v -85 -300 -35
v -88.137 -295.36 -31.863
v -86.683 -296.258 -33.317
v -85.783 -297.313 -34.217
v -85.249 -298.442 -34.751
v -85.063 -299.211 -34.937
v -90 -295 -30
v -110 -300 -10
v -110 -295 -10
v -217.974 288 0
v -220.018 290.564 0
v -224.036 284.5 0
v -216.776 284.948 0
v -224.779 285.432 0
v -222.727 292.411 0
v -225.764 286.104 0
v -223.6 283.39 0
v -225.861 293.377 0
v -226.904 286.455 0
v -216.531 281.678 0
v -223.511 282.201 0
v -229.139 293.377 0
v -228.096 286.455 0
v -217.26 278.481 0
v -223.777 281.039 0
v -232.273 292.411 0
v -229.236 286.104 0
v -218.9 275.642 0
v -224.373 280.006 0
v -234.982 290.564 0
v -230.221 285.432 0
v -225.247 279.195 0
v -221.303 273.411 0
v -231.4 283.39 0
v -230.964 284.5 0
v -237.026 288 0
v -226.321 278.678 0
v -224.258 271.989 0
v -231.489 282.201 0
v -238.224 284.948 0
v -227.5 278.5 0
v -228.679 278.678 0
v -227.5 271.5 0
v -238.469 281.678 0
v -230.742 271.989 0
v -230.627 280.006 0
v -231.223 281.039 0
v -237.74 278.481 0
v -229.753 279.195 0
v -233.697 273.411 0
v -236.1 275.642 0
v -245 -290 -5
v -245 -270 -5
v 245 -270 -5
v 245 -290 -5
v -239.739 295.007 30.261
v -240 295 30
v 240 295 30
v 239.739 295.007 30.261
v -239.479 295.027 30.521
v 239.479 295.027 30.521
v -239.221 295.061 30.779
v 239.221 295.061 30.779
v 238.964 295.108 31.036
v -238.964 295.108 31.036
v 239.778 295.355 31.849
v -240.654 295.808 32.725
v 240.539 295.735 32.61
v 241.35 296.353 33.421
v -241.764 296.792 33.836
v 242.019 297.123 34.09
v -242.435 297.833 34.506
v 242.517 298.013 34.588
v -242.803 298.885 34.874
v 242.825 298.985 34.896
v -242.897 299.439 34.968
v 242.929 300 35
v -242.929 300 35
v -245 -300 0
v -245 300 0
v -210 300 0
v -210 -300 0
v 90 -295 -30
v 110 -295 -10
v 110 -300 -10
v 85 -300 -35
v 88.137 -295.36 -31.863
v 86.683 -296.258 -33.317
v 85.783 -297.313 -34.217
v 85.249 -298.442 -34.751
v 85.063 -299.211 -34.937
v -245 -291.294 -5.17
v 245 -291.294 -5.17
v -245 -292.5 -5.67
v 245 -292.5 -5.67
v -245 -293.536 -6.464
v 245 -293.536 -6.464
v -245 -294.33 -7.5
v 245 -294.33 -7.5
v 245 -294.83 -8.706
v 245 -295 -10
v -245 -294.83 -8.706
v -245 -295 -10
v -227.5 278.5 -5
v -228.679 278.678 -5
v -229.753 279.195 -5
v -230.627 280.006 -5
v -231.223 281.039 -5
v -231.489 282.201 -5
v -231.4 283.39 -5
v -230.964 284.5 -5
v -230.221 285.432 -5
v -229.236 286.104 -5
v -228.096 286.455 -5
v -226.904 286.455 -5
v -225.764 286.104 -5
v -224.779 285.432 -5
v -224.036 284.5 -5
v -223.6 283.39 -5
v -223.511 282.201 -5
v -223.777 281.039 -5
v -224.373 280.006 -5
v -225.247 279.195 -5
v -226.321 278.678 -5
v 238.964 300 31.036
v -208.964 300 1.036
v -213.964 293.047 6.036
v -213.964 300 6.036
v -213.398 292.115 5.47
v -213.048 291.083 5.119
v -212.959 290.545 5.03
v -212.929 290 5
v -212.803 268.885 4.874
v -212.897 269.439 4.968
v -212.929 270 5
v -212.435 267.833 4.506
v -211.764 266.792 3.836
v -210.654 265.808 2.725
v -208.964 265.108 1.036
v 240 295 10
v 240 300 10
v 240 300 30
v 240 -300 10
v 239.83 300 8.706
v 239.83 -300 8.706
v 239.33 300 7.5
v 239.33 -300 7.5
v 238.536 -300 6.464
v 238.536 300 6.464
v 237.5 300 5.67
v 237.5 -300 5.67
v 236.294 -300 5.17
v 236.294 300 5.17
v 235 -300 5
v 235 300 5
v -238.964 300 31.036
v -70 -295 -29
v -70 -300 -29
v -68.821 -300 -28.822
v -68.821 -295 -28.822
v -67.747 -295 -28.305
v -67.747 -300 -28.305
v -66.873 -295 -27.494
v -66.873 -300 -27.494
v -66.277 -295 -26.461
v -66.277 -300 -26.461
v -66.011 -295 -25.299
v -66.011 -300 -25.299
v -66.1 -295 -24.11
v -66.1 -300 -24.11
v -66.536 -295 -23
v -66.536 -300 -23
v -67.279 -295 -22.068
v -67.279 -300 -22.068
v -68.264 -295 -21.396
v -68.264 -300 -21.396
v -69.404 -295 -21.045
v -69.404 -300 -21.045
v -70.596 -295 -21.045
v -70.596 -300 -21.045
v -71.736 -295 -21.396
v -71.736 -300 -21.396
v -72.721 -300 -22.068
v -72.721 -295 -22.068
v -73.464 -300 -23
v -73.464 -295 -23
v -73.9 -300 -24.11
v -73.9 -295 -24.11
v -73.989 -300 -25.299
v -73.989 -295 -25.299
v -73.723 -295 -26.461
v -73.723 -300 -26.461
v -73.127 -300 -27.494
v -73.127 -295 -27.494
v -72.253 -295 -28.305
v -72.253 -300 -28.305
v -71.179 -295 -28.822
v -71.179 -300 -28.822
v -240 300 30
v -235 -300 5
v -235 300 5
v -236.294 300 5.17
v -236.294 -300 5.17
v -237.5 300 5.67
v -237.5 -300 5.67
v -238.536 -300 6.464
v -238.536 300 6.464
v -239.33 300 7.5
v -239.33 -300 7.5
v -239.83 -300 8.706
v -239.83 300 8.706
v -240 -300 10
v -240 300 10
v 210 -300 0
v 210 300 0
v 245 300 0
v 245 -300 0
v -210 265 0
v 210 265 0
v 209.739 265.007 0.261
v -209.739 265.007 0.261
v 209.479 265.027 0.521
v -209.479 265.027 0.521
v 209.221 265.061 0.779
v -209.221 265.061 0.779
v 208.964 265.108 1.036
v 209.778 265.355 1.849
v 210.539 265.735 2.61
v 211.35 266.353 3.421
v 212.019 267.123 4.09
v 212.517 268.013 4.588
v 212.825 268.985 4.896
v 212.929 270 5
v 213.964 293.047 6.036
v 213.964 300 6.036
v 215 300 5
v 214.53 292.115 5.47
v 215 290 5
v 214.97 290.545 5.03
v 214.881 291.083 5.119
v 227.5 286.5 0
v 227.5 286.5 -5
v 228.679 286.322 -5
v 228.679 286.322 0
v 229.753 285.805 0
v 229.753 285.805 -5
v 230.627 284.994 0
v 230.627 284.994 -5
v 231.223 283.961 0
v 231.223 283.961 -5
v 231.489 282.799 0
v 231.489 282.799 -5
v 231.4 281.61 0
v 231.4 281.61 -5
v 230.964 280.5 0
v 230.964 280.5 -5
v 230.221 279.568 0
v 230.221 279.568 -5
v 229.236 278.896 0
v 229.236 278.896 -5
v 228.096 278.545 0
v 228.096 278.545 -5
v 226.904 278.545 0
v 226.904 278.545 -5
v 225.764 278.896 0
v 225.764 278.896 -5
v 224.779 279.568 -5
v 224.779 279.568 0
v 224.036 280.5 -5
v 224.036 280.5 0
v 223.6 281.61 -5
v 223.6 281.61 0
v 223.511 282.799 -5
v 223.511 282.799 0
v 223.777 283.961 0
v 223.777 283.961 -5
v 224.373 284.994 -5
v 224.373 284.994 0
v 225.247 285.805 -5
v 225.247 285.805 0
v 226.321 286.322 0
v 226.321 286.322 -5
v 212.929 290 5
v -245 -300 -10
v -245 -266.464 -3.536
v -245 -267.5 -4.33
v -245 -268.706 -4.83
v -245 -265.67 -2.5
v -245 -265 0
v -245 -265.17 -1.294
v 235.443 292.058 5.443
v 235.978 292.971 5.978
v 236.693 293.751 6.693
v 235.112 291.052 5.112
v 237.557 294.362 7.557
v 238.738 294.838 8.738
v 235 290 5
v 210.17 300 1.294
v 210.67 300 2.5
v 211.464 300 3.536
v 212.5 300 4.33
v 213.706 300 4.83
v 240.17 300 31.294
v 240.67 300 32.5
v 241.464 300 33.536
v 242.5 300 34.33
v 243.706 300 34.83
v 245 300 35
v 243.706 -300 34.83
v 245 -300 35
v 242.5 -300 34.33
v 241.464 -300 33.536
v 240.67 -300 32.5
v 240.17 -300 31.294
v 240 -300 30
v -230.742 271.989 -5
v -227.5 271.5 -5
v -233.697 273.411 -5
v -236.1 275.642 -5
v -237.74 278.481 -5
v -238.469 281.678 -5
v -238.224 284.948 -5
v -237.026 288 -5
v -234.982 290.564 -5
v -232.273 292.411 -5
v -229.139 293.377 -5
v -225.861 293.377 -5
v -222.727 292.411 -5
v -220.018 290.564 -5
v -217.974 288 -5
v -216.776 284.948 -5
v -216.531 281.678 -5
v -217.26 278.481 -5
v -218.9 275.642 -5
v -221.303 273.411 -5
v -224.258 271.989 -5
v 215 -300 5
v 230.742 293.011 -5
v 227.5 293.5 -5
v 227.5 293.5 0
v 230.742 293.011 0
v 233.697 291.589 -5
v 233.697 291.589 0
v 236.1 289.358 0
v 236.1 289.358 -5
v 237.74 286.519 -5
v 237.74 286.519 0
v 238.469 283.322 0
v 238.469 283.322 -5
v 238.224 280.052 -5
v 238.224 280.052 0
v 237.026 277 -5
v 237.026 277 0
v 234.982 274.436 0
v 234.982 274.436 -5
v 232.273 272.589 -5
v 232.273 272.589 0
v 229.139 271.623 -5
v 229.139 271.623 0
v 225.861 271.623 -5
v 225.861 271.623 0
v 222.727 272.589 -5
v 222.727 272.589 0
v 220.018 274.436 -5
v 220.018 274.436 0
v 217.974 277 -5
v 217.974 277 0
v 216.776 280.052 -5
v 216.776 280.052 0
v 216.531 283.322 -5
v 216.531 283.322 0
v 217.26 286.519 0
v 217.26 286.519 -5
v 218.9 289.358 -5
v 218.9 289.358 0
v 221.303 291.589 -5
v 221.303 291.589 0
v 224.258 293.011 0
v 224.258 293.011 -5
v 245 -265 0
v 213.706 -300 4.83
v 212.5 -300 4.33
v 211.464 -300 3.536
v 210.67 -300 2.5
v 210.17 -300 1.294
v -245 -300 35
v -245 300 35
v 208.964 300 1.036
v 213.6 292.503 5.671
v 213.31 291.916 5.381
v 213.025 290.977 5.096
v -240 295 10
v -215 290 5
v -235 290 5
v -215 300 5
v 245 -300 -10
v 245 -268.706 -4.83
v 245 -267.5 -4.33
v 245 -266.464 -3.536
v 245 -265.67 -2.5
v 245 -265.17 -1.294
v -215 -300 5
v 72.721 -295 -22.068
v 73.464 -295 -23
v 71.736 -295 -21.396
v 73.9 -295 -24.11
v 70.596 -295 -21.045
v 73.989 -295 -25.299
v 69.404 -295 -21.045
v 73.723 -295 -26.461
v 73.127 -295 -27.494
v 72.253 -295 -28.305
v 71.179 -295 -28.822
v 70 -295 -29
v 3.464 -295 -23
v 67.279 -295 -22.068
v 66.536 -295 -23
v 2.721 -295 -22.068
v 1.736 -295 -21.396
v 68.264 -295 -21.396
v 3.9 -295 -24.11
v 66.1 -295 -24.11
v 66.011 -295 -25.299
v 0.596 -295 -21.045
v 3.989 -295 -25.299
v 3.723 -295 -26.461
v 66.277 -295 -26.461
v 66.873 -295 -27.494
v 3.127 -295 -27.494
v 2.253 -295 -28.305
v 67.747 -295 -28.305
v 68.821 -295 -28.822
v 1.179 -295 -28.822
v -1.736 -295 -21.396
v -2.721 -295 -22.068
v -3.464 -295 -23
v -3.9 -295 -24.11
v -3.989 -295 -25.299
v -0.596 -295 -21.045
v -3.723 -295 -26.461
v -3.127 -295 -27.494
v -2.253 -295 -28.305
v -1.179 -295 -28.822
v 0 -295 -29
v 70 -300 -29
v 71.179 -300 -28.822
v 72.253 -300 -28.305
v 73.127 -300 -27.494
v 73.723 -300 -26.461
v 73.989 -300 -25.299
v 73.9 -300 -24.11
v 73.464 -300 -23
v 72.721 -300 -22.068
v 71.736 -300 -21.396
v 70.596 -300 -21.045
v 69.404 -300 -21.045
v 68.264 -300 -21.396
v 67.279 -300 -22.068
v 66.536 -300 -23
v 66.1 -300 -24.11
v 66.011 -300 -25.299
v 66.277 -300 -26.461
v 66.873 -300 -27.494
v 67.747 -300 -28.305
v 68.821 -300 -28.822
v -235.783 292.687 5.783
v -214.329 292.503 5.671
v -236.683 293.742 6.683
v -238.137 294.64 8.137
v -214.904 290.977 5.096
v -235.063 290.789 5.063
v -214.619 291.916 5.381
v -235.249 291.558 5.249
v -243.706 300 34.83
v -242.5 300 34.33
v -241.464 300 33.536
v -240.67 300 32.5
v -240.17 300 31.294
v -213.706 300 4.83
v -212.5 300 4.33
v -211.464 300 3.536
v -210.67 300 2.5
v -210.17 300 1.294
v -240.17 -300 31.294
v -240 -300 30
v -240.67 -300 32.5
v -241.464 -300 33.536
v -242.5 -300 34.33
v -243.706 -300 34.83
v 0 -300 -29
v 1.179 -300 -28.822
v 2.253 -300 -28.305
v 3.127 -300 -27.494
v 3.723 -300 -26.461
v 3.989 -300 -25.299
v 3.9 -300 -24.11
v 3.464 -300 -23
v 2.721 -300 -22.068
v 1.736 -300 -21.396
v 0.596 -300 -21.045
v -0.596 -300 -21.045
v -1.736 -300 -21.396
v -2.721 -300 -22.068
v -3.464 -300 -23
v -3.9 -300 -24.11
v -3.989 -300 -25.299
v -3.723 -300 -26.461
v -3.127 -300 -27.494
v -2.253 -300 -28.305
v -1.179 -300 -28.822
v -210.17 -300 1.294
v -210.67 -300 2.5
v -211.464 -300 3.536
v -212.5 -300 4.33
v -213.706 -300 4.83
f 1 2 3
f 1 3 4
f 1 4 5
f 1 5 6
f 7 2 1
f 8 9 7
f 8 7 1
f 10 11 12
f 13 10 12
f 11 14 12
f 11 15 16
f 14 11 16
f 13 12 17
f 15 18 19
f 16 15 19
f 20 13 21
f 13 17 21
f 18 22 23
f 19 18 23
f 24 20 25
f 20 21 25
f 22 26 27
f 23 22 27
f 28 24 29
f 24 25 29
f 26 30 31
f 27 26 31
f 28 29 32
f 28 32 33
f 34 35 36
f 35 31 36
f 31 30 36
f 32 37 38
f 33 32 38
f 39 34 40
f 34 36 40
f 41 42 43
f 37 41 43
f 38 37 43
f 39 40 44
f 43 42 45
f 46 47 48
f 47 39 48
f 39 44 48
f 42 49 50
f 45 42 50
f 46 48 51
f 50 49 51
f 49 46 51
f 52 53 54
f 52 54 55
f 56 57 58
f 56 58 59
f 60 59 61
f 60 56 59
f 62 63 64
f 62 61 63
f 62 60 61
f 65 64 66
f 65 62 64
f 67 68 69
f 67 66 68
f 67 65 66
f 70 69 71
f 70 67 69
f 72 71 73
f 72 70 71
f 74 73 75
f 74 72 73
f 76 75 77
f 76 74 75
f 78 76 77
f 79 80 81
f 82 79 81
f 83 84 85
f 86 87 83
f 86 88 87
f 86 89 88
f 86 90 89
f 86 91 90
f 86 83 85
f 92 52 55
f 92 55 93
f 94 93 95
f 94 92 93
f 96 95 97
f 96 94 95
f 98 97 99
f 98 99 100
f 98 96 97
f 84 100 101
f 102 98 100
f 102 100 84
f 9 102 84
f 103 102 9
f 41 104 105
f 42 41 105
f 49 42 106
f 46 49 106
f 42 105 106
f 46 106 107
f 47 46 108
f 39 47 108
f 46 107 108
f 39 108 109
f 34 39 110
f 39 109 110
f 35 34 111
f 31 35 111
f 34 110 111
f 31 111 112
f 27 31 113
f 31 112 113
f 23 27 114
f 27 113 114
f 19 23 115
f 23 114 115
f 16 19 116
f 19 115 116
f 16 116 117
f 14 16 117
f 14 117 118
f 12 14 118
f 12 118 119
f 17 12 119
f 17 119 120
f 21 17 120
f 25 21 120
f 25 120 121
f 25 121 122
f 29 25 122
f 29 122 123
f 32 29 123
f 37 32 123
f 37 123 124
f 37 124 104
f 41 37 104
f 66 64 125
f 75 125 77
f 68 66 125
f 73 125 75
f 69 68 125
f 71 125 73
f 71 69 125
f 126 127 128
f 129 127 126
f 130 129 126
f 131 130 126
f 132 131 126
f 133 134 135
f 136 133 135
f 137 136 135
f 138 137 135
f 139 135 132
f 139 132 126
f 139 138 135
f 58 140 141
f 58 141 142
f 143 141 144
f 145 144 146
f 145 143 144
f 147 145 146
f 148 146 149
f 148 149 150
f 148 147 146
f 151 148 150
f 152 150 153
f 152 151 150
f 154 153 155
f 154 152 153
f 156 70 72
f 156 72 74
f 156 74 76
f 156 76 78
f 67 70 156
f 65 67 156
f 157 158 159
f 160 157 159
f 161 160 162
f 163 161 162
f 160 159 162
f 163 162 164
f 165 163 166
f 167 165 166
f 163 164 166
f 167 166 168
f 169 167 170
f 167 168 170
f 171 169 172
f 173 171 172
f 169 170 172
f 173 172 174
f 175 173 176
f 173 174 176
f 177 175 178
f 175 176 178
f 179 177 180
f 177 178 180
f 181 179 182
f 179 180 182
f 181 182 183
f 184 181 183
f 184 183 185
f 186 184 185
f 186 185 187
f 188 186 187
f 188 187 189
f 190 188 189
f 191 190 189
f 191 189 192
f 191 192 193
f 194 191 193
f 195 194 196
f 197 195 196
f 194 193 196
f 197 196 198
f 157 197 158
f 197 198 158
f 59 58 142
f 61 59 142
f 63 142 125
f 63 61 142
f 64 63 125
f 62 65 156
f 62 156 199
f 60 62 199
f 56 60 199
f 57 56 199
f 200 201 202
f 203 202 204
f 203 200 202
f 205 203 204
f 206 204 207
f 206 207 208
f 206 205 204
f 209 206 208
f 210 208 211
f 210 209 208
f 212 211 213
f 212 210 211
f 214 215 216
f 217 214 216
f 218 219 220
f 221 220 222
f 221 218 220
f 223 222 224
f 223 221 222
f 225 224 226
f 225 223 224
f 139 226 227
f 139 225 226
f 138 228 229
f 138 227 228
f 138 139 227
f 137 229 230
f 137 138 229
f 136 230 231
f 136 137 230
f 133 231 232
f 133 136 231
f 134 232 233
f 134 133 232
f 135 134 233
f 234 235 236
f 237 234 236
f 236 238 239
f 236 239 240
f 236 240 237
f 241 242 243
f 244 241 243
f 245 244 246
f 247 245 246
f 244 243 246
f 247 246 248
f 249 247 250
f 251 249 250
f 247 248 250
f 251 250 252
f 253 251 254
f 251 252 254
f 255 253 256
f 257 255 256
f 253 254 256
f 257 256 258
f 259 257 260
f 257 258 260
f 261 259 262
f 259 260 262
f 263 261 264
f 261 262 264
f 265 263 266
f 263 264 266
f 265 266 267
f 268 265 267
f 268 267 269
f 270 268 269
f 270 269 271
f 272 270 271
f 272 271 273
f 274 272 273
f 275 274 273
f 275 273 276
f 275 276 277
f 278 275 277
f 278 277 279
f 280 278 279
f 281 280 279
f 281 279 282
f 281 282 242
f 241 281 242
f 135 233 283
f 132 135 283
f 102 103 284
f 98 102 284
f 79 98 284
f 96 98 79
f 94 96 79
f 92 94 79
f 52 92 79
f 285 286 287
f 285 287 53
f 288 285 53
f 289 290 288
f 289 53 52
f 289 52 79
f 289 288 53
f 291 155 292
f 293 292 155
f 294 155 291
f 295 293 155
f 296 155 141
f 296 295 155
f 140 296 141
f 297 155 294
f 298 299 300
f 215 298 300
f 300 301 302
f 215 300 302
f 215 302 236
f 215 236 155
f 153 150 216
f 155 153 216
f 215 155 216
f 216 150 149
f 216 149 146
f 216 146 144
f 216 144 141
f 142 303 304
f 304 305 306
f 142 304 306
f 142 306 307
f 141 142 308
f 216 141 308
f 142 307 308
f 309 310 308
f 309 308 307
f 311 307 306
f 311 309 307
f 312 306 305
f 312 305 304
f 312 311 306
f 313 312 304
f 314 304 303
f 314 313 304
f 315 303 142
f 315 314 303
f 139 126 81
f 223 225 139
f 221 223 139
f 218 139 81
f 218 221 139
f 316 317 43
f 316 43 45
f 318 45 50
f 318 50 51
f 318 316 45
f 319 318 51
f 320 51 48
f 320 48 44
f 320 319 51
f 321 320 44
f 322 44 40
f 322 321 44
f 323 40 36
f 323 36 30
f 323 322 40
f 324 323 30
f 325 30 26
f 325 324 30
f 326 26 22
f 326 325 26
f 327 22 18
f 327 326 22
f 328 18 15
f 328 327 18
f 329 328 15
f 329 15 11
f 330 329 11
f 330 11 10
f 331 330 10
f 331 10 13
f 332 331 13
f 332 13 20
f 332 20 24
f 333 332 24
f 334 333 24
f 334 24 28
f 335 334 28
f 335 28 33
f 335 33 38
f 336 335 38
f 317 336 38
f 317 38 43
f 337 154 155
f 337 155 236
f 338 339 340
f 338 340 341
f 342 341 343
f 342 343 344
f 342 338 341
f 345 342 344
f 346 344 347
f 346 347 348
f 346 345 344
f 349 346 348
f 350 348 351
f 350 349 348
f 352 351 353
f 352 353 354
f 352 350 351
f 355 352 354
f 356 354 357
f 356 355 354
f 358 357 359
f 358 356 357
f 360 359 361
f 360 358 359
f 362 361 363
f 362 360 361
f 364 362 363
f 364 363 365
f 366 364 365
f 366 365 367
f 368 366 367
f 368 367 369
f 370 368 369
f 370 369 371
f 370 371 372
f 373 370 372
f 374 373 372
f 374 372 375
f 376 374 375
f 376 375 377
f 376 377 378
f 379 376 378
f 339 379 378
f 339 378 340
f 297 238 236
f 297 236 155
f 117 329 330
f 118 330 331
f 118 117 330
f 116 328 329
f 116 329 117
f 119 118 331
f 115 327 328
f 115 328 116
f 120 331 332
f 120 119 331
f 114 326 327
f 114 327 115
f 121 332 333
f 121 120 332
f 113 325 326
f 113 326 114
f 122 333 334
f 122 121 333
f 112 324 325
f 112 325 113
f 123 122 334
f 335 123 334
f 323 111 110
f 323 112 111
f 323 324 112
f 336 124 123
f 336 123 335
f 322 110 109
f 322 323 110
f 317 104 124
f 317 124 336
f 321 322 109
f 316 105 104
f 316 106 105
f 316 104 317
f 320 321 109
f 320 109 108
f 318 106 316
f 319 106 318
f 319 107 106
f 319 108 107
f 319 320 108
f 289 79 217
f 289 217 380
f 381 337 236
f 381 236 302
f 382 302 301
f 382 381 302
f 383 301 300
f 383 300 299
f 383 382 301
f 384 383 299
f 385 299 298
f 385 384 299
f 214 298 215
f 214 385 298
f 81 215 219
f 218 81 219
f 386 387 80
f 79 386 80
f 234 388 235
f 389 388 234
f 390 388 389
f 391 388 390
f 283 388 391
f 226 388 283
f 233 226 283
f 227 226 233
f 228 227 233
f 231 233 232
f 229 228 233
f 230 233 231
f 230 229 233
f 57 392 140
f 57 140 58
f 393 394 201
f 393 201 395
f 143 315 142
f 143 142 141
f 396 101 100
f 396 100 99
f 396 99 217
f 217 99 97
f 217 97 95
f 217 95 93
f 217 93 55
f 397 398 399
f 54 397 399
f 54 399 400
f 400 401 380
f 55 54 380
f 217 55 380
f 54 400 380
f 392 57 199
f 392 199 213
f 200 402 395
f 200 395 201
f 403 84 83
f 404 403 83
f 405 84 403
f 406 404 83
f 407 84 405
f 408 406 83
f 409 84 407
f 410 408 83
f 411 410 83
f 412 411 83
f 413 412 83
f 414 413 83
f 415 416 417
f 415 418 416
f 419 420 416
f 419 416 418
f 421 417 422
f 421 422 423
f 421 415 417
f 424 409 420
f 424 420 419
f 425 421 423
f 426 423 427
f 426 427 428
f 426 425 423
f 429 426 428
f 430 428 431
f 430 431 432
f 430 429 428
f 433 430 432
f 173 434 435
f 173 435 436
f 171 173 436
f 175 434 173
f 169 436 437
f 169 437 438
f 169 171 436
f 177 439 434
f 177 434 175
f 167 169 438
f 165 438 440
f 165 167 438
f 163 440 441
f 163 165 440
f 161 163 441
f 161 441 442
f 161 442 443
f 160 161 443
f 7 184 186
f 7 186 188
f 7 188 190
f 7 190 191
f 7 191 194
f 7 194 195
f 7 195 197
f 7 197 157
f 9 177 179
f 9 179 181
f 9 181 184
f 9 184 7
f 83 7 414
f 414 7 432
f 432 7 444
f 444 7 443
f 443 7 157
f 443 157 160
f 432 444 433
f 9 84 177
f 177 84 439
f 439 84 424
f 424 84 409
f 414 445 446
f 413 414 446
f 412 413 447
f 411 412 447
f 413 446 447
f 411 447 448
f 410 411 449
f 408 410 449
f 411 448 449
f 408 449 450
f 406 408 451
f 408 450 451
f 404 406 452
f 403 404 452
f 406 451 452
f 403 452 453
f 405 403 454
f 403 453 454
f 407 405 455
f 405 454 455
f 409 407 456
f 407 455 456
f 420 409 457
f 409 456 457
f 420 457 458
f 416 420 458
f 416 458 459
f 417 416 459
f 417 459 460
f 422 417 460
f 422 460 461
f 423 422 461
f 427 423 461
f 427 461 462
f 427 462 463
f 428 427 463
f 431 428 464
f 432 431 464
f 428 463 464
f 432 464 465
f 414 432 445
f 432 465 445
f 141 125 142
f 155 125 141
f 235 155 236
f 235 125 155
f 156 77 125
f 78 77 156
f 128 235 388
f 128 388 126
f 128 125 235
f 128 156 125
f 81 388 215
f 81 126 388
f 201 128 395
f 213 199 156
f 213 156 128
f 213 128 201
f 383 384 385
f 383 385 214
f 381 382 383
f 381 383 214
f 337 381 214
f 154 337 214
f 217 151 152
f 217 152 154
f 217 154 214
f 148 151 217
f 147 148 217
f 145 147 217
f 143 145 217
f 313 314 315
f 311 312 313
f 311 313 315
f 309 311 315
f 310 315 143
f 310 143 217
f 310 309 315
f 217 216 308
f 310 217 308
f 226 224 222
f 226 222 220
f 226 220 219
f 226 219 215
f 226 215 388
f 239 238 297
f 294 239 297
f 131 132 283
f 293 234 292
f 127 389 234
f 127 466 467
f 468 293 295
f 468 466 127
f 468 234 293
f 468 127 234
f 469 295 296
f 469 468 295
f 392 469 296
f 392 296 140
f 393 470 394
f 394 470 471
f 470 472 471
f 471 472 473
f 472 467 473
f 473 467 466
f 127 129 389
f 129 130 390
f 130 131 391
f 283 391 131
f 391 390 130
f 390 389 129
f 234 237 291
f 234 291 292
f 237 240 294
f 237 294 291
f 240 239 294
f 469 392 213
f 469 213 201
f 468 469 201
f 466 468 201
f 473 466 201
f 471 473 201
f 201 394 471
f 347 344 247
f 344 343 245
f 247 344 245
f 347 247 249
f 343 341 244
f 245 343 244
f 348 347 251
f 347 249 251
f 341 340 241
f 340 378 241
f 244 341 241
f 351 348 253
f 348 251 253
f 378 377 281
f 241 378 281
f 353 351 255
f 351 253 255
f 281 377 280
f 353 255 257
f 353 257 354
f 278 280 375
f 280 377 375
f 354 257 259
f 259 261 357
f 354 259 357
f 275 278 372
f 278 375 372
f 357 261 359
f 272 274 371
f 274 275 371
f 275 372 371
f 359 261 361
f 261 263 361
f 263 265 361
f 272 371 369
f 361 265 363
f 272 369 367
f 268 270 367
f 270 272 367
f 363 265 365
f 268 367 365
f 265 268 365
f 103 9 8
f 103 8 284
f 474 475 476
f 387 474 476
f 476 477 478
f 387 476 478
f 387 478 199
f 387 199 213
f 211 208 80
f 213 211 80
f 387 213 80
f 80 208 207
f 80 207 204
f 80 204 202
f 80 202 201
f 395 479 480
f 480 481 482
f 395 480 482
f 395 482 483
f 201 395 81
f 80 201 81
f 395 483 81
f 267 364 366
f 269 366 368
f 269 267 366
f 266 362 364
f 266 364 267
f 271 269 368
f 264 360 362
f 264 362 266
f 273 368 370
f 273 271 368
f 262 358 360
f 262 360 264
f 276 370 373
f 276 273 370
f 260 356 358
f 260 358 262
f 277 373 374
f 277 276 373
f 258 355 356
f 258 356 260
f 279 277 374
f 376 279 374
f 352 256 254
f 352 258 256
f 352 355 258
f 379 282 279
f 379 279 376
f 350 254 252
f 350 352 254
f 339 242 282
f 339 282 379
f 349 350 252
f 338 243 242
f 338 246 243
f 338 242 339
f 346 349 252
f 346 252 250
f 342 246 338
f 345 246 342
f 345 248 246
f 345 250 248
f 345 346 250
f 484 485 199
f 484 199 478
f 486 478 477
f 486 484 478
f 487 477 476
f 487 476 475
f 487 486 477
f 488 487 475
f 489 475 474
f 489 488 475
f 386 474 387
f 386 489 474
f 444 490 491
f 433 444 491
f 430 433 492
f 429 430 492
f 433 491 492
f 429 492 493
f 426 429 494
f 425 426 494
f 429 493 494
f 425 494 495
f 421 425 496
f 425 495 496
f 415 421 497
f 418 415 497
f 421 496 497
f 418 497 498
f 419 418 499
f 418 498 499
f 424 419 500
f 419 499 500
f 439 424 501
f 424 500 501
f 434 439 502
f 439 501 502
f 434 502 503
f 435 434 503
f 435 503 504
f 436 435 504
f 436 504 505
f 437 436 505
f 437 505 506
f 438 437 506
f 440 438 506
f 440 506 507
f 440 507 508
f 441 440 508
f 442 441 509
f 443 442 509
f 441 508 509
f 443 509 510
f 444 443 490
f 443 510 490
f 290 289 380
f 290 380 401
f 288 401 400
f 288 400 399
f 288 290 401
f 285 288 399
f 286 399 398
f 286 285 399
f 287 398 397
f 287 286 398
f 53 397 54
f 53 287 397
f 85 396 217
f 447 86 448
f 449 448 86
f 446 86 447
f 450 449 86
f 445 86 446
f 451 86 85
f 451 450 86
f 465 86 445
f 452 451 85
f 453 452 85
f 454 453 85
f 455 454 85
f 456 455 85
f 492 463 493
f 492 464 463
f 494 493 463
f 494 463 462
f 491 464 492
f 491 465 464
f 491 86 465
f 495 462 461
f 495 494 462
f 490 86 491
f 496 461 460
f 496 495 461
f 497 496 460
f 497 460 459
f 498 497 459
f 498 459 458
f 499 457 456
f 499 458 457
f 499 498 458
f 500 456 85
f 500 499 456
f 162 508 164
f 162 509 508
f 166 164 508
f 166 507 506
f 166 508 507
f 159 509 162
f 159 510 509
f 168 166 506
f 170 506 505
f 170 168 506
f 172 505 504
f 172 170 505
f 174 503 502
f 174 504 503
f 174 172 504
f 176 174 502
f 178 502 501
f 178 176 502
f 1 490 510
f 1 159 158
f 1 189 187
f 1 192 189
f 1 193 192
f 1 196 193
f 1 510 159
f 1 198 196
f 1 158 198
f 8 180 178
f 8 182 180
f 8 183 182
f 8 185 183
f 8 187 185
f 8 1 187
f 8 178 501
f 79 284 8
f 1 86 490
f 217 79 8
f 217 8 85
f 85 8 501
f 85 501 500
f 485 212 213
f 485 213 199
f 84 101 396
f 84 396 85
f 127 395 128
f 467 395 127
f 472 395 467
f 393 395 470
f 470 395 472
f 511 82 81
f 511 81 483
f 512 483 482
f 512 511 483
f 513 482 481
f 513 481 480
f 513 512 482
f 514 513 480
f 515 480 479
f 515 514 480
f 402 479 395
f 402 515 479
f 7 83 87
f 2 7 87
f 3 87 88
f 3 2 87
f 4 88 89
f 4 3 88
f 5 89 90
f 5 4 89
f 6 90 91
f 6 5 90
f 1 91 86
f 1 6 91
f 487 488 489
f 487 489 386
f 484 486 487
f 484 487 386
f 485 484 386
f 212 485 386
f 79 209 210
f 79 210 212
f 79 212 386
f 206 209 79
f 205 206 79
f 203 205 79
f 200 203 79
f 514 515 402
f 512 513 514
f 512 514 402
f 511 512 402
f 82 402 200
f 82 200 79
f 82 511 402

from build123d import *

# Parameters (mm, degrees)
HIERRO_ANGULAR_35_X_35_X_5_1_DEPTH = 600
HIERRO_ANGULAR_35_X_35_X_5_2_DEPTH = 600
HIERRO_ANGULAR_35_X_35_X_5_3_DEPTH = 490
HIERRO_ANGULAR_35_X_35_X_5_5_DEPTH = 490
SALIENTE_EXTRUIR1_REACH            = 391.391
CROQUIS8_R                         = 11
CROQUIS8_R_2                       = 4
RECORTAR_EXTENDER1_START           = 265
RECORTAR_EXTENDER1_DEPTH           = 35
CROQUIS12_W                        = 140
CROQUIS12_H                        = 25
CORTAR_EXTRUIR1_DEPTH              = 10
CHAFL_N1_SIZE                      = 5
CROQUIS13_R                        = 4
CORTAR_EXTRUIR2_DEPTH              = 5
CORTAR_EXTRUIR3_DEPTH              = 5


# Read off the part's stored shape, not the designer's step: Recortar/Extender1
with BuildPart() as part:
    # Sketch1 → Hierro angular 35 X 35 X 5(1) (new body)
    with BuildSketch(Plane(origin=(-245, -300, 0), x_dir=(0, 0, 1), z_dir=(0, 1, 0))):
        with BuildLine():
            Line((0, 0), (0, 35))
            ThreePointArc((0, 35), (3.535533906, 33.535533906), (5, 30))
            Line((5, 30), (5, 10))
            ThreePointArc((5, 10), (6.464466094, 6.464466094), (10, 5))
            Line((10, 5), (30, 5))
            ThreePointArc((30, 5), (33.535533906, 3.535533906), (35, 0))
            Line((35, 0), (0, 0))
        make_face()
    extrude(amount=HIERRO_ANGULAR_35_X_35_X_5_1_DEPTH)


with BuildPart() as body_2:
    # Sketch11 → Hierro angular 35 X 35 X 5(2) (new body)
    with BuildSketch(Plane(origin=(245, -300, 0), x_dir=(-1, 0, 0), z_dir=(0, 1, 0))):
        with BuildLine():
            Line((0, 0), (0, 35))
            ThreePointArc((0, 35), (3.535533906, 33.535533906), (5, 30))
            Line((5, 30), (5, 10))
            ThreePointArc((5, 10), (6.464466094, 6.464466094), (10, 5))
            Line((10, 5), (30, 5))
            ThreePointArc((30, 5), (33.535533906, 3.535533906), (35, 0))
            Line((35, 0), (0, 0))
        make_face()
    extrude(amount=HIERRO_ANGULAR_35_X_35_X_5_2_DEPTH)


with BuildPart() as body_3:
    # Sketch12 → Hierro angular 35 X 35 X 5(3) (new body)
    with BuildSketch(Plane(origin=(-245, 300, 0), x_dir=(0, 0, 1), z_dir=(1, 0, 0))):
        with BuildLine():
            Line((0, 0), (0, 35))
            ThreePointArc((0, 35), (3.535533906, 33.535533906), (5, 30))
            Line((5, 30), (5, 10))
            ThreePointArc((5, 10), (6.464466094, 6.464466094), (10, 5))
            Line((10, 5), (30, 5))
            ThreePointArc((30, 5), (33.535533906, 3.535533906), (35, 0))
            Line((35, 0), (0, 0))
        make_face()
    extrude(amount=HIERRO_ANGULAR_35_X_35_X_5_3_DEPTH)


with BuildPart() as body_4:
    # Sketch14 → Hierro angular 35 X 35 X 5(5) (new body)
    with BuildSketch(Plane(origin=(-245, -300, 0), x_dir=(0, 0, -1), z_dir=(1, 0, 0))):
        with BuildLine():
            Line((0, 0), (0, 35))
            ThreePointArc((0, 35), (3.535533906, 33.535533906), (5, 30))
            Line((5, 30), (5, 10))
            ThreePointArc((5, 10), (6.464466094, 6.464466094), (10, 5))
            Line((10, 5), (30, 5))
            ThreePointArc((30, 5), (33.535533906, 3.535533906), (35, 0))
            Line((35, 0), (0, 0))
        make_face()
    extrude(amount=HIERRO_ANGULAR_35_X_35_X_5_5_DEPTH)

    # Croquis12 → Cortar-Extruir1 (cut)
    with BuildSketch(Plane(origin=(0, -290, 0), x_dir=(-1, 0, 0), z_dir=(0, 1, 0))):
        with Locations((-175, -22.5)):
            Rectangle(CROQUIS12_W, CROQUIS12_H)
        with Locations((175, -22.5)):
            Rectangle(CROQUIS12_W, CROQUIS12_H)
    extrude(amount=-CORTAR_EXTRUIR1_DEPTH, mode=Mode.SUBTRACT)

    # Chaflán1
    chafl_n1_edges = [body_4.edges().sort_by_distance(p)[0] for p in [
        (105, -297.5, -10),
        (-105, -297.5, -10),
    ]]
    chamfer(chafl_n1_edges, length=CHAFL_N1_SIZE)

    # Croquis13 → Cortar-Extruir2 (cut)
    with BuildSketch(Plane.XZ.offset(300)):
        with Locations(Location((0, -25, 0), (0, 0, 270))):
            Circle(CROQUIS13_R)
        with Locations(Location((70, -25, 0), (0, 0, 270))):
            Circle(CROQUIS13_R)
        with Locations(Location((-70, -25, 0), (0, 0, 270))):
            Circle(CROQUIS13_R)
    extrude(amount=-CORTAR_EXTRUIR2_DEPTH, mode=Mode.SUBTRACT)

    # Croquis14 → Cortar-Extruir3 (cut)
    with BuildSketch(Plane.XZ.offset(300)):
        Polygon((-105, -15), (-85, -35), (-105, -35), align=None)
        Polygon((105, -15), (85, -35), (105, -35), align=None)
    extrude(amount=-CORTAR_EXTRUIR3_DEPTH, mode=Mode.SUBTRACT)


with BuildPart() as body_5:

    # Croquis8 → Saliente-Extruir1 (new, up to next)
    with BuildSketch(Plane(origin=(0, 0, -5), x_dir=(-1, 0, 0), z_dir=(0, 0, -1)), mode=Mode.PRIVATE) as saliente_extruir1_sk1:
        with Locations(Location((-227.5, 282.5, 0), (0, 0, 90))):
            Circle(CROQUIS8_R)
        with Locations(Location((-227.5, 282.5, 0), (0, 0, 90))):
            Circle(CROQUIS8_R_2, mode=Mode.SUBTRACT)
    saliente_extruir1_tool1 = extrude(saliente_extruir1_sk1.sketch, amount=-SALIENTE_EXTRUIR1_REACH, mode=Mode.PRIVATE) - body_3.part
    # Croquis8 → Saliente-Extruir1 (new, up to next)
    with BuildSketch(Plane(origin=(0, 0, -5), x_dir=(-1, 0, 0), z_dir=(0, 0, -1)), mode=Mode.PRIVATE) as saliente_extruir1_sk2:
        with Locations(Location((227.5, 282.5, 0), (0, 0, 270))):
            Circle(CROQUIS8_R)
        with Locations(Location((227.5, 282.5, 0), (0, 0, 270))):
            Circle(CROQUIS8_R_2, mode=Mode.SUBTRACT)
    saliente_extruir1_tool2 = extrude(saliente_extruir1_sk2.sketch, amount=-SALIENTE_EXTRUIR1_REACH, mode=Mode.PRIVATE) - body_3.part
    add(saliente_extruir1_tool1.solids().sort_by_distance((227.5, 271.811127, -5))[0])
    add(saliente_extruir1_tool2.solids().sort_by_distance((-227.5, 293.188873, -5))[0])


with BuildPart() as body_3_1:
    add(body_3.part)

    # Recortar/Extender1 outline → Recortar/Extender1 (cut)
    with BuildSketch(Plane(origin=(0, 0, 0), x_dir=(1, 0, 0), z_dir=(0, 1, 0)).offset(RECORTAR_EXTENDER1_START)):
        Polygon((-243.928932188, -36), (-238.964466094, -31.035533906), (-240, -30), (-240, -10), (-235, -5), (-215, -5), (-213.964466094, -6.035533906), (-208.964466094, -1.035533906), (-212, 2), (-245, 2), (-245, -36), align=None)
        Polygon((238.964466094, -31.035533906), (243.928932188, -36), (245, -36), (245, 2), (212, 2), (208.964466094, -1.035533906), (213.964466094, -6.035533906), (215, -5), (235, -5), (240, -10), (240, -30), align=None)
    extrude(amount=RECORTAR_EXTENDER1_DEPTH, mode=Mode.SUBTRACT)


solid = Compound([part.part, body_2.part, body_4.part, body_5.part, body_3_1.part])
